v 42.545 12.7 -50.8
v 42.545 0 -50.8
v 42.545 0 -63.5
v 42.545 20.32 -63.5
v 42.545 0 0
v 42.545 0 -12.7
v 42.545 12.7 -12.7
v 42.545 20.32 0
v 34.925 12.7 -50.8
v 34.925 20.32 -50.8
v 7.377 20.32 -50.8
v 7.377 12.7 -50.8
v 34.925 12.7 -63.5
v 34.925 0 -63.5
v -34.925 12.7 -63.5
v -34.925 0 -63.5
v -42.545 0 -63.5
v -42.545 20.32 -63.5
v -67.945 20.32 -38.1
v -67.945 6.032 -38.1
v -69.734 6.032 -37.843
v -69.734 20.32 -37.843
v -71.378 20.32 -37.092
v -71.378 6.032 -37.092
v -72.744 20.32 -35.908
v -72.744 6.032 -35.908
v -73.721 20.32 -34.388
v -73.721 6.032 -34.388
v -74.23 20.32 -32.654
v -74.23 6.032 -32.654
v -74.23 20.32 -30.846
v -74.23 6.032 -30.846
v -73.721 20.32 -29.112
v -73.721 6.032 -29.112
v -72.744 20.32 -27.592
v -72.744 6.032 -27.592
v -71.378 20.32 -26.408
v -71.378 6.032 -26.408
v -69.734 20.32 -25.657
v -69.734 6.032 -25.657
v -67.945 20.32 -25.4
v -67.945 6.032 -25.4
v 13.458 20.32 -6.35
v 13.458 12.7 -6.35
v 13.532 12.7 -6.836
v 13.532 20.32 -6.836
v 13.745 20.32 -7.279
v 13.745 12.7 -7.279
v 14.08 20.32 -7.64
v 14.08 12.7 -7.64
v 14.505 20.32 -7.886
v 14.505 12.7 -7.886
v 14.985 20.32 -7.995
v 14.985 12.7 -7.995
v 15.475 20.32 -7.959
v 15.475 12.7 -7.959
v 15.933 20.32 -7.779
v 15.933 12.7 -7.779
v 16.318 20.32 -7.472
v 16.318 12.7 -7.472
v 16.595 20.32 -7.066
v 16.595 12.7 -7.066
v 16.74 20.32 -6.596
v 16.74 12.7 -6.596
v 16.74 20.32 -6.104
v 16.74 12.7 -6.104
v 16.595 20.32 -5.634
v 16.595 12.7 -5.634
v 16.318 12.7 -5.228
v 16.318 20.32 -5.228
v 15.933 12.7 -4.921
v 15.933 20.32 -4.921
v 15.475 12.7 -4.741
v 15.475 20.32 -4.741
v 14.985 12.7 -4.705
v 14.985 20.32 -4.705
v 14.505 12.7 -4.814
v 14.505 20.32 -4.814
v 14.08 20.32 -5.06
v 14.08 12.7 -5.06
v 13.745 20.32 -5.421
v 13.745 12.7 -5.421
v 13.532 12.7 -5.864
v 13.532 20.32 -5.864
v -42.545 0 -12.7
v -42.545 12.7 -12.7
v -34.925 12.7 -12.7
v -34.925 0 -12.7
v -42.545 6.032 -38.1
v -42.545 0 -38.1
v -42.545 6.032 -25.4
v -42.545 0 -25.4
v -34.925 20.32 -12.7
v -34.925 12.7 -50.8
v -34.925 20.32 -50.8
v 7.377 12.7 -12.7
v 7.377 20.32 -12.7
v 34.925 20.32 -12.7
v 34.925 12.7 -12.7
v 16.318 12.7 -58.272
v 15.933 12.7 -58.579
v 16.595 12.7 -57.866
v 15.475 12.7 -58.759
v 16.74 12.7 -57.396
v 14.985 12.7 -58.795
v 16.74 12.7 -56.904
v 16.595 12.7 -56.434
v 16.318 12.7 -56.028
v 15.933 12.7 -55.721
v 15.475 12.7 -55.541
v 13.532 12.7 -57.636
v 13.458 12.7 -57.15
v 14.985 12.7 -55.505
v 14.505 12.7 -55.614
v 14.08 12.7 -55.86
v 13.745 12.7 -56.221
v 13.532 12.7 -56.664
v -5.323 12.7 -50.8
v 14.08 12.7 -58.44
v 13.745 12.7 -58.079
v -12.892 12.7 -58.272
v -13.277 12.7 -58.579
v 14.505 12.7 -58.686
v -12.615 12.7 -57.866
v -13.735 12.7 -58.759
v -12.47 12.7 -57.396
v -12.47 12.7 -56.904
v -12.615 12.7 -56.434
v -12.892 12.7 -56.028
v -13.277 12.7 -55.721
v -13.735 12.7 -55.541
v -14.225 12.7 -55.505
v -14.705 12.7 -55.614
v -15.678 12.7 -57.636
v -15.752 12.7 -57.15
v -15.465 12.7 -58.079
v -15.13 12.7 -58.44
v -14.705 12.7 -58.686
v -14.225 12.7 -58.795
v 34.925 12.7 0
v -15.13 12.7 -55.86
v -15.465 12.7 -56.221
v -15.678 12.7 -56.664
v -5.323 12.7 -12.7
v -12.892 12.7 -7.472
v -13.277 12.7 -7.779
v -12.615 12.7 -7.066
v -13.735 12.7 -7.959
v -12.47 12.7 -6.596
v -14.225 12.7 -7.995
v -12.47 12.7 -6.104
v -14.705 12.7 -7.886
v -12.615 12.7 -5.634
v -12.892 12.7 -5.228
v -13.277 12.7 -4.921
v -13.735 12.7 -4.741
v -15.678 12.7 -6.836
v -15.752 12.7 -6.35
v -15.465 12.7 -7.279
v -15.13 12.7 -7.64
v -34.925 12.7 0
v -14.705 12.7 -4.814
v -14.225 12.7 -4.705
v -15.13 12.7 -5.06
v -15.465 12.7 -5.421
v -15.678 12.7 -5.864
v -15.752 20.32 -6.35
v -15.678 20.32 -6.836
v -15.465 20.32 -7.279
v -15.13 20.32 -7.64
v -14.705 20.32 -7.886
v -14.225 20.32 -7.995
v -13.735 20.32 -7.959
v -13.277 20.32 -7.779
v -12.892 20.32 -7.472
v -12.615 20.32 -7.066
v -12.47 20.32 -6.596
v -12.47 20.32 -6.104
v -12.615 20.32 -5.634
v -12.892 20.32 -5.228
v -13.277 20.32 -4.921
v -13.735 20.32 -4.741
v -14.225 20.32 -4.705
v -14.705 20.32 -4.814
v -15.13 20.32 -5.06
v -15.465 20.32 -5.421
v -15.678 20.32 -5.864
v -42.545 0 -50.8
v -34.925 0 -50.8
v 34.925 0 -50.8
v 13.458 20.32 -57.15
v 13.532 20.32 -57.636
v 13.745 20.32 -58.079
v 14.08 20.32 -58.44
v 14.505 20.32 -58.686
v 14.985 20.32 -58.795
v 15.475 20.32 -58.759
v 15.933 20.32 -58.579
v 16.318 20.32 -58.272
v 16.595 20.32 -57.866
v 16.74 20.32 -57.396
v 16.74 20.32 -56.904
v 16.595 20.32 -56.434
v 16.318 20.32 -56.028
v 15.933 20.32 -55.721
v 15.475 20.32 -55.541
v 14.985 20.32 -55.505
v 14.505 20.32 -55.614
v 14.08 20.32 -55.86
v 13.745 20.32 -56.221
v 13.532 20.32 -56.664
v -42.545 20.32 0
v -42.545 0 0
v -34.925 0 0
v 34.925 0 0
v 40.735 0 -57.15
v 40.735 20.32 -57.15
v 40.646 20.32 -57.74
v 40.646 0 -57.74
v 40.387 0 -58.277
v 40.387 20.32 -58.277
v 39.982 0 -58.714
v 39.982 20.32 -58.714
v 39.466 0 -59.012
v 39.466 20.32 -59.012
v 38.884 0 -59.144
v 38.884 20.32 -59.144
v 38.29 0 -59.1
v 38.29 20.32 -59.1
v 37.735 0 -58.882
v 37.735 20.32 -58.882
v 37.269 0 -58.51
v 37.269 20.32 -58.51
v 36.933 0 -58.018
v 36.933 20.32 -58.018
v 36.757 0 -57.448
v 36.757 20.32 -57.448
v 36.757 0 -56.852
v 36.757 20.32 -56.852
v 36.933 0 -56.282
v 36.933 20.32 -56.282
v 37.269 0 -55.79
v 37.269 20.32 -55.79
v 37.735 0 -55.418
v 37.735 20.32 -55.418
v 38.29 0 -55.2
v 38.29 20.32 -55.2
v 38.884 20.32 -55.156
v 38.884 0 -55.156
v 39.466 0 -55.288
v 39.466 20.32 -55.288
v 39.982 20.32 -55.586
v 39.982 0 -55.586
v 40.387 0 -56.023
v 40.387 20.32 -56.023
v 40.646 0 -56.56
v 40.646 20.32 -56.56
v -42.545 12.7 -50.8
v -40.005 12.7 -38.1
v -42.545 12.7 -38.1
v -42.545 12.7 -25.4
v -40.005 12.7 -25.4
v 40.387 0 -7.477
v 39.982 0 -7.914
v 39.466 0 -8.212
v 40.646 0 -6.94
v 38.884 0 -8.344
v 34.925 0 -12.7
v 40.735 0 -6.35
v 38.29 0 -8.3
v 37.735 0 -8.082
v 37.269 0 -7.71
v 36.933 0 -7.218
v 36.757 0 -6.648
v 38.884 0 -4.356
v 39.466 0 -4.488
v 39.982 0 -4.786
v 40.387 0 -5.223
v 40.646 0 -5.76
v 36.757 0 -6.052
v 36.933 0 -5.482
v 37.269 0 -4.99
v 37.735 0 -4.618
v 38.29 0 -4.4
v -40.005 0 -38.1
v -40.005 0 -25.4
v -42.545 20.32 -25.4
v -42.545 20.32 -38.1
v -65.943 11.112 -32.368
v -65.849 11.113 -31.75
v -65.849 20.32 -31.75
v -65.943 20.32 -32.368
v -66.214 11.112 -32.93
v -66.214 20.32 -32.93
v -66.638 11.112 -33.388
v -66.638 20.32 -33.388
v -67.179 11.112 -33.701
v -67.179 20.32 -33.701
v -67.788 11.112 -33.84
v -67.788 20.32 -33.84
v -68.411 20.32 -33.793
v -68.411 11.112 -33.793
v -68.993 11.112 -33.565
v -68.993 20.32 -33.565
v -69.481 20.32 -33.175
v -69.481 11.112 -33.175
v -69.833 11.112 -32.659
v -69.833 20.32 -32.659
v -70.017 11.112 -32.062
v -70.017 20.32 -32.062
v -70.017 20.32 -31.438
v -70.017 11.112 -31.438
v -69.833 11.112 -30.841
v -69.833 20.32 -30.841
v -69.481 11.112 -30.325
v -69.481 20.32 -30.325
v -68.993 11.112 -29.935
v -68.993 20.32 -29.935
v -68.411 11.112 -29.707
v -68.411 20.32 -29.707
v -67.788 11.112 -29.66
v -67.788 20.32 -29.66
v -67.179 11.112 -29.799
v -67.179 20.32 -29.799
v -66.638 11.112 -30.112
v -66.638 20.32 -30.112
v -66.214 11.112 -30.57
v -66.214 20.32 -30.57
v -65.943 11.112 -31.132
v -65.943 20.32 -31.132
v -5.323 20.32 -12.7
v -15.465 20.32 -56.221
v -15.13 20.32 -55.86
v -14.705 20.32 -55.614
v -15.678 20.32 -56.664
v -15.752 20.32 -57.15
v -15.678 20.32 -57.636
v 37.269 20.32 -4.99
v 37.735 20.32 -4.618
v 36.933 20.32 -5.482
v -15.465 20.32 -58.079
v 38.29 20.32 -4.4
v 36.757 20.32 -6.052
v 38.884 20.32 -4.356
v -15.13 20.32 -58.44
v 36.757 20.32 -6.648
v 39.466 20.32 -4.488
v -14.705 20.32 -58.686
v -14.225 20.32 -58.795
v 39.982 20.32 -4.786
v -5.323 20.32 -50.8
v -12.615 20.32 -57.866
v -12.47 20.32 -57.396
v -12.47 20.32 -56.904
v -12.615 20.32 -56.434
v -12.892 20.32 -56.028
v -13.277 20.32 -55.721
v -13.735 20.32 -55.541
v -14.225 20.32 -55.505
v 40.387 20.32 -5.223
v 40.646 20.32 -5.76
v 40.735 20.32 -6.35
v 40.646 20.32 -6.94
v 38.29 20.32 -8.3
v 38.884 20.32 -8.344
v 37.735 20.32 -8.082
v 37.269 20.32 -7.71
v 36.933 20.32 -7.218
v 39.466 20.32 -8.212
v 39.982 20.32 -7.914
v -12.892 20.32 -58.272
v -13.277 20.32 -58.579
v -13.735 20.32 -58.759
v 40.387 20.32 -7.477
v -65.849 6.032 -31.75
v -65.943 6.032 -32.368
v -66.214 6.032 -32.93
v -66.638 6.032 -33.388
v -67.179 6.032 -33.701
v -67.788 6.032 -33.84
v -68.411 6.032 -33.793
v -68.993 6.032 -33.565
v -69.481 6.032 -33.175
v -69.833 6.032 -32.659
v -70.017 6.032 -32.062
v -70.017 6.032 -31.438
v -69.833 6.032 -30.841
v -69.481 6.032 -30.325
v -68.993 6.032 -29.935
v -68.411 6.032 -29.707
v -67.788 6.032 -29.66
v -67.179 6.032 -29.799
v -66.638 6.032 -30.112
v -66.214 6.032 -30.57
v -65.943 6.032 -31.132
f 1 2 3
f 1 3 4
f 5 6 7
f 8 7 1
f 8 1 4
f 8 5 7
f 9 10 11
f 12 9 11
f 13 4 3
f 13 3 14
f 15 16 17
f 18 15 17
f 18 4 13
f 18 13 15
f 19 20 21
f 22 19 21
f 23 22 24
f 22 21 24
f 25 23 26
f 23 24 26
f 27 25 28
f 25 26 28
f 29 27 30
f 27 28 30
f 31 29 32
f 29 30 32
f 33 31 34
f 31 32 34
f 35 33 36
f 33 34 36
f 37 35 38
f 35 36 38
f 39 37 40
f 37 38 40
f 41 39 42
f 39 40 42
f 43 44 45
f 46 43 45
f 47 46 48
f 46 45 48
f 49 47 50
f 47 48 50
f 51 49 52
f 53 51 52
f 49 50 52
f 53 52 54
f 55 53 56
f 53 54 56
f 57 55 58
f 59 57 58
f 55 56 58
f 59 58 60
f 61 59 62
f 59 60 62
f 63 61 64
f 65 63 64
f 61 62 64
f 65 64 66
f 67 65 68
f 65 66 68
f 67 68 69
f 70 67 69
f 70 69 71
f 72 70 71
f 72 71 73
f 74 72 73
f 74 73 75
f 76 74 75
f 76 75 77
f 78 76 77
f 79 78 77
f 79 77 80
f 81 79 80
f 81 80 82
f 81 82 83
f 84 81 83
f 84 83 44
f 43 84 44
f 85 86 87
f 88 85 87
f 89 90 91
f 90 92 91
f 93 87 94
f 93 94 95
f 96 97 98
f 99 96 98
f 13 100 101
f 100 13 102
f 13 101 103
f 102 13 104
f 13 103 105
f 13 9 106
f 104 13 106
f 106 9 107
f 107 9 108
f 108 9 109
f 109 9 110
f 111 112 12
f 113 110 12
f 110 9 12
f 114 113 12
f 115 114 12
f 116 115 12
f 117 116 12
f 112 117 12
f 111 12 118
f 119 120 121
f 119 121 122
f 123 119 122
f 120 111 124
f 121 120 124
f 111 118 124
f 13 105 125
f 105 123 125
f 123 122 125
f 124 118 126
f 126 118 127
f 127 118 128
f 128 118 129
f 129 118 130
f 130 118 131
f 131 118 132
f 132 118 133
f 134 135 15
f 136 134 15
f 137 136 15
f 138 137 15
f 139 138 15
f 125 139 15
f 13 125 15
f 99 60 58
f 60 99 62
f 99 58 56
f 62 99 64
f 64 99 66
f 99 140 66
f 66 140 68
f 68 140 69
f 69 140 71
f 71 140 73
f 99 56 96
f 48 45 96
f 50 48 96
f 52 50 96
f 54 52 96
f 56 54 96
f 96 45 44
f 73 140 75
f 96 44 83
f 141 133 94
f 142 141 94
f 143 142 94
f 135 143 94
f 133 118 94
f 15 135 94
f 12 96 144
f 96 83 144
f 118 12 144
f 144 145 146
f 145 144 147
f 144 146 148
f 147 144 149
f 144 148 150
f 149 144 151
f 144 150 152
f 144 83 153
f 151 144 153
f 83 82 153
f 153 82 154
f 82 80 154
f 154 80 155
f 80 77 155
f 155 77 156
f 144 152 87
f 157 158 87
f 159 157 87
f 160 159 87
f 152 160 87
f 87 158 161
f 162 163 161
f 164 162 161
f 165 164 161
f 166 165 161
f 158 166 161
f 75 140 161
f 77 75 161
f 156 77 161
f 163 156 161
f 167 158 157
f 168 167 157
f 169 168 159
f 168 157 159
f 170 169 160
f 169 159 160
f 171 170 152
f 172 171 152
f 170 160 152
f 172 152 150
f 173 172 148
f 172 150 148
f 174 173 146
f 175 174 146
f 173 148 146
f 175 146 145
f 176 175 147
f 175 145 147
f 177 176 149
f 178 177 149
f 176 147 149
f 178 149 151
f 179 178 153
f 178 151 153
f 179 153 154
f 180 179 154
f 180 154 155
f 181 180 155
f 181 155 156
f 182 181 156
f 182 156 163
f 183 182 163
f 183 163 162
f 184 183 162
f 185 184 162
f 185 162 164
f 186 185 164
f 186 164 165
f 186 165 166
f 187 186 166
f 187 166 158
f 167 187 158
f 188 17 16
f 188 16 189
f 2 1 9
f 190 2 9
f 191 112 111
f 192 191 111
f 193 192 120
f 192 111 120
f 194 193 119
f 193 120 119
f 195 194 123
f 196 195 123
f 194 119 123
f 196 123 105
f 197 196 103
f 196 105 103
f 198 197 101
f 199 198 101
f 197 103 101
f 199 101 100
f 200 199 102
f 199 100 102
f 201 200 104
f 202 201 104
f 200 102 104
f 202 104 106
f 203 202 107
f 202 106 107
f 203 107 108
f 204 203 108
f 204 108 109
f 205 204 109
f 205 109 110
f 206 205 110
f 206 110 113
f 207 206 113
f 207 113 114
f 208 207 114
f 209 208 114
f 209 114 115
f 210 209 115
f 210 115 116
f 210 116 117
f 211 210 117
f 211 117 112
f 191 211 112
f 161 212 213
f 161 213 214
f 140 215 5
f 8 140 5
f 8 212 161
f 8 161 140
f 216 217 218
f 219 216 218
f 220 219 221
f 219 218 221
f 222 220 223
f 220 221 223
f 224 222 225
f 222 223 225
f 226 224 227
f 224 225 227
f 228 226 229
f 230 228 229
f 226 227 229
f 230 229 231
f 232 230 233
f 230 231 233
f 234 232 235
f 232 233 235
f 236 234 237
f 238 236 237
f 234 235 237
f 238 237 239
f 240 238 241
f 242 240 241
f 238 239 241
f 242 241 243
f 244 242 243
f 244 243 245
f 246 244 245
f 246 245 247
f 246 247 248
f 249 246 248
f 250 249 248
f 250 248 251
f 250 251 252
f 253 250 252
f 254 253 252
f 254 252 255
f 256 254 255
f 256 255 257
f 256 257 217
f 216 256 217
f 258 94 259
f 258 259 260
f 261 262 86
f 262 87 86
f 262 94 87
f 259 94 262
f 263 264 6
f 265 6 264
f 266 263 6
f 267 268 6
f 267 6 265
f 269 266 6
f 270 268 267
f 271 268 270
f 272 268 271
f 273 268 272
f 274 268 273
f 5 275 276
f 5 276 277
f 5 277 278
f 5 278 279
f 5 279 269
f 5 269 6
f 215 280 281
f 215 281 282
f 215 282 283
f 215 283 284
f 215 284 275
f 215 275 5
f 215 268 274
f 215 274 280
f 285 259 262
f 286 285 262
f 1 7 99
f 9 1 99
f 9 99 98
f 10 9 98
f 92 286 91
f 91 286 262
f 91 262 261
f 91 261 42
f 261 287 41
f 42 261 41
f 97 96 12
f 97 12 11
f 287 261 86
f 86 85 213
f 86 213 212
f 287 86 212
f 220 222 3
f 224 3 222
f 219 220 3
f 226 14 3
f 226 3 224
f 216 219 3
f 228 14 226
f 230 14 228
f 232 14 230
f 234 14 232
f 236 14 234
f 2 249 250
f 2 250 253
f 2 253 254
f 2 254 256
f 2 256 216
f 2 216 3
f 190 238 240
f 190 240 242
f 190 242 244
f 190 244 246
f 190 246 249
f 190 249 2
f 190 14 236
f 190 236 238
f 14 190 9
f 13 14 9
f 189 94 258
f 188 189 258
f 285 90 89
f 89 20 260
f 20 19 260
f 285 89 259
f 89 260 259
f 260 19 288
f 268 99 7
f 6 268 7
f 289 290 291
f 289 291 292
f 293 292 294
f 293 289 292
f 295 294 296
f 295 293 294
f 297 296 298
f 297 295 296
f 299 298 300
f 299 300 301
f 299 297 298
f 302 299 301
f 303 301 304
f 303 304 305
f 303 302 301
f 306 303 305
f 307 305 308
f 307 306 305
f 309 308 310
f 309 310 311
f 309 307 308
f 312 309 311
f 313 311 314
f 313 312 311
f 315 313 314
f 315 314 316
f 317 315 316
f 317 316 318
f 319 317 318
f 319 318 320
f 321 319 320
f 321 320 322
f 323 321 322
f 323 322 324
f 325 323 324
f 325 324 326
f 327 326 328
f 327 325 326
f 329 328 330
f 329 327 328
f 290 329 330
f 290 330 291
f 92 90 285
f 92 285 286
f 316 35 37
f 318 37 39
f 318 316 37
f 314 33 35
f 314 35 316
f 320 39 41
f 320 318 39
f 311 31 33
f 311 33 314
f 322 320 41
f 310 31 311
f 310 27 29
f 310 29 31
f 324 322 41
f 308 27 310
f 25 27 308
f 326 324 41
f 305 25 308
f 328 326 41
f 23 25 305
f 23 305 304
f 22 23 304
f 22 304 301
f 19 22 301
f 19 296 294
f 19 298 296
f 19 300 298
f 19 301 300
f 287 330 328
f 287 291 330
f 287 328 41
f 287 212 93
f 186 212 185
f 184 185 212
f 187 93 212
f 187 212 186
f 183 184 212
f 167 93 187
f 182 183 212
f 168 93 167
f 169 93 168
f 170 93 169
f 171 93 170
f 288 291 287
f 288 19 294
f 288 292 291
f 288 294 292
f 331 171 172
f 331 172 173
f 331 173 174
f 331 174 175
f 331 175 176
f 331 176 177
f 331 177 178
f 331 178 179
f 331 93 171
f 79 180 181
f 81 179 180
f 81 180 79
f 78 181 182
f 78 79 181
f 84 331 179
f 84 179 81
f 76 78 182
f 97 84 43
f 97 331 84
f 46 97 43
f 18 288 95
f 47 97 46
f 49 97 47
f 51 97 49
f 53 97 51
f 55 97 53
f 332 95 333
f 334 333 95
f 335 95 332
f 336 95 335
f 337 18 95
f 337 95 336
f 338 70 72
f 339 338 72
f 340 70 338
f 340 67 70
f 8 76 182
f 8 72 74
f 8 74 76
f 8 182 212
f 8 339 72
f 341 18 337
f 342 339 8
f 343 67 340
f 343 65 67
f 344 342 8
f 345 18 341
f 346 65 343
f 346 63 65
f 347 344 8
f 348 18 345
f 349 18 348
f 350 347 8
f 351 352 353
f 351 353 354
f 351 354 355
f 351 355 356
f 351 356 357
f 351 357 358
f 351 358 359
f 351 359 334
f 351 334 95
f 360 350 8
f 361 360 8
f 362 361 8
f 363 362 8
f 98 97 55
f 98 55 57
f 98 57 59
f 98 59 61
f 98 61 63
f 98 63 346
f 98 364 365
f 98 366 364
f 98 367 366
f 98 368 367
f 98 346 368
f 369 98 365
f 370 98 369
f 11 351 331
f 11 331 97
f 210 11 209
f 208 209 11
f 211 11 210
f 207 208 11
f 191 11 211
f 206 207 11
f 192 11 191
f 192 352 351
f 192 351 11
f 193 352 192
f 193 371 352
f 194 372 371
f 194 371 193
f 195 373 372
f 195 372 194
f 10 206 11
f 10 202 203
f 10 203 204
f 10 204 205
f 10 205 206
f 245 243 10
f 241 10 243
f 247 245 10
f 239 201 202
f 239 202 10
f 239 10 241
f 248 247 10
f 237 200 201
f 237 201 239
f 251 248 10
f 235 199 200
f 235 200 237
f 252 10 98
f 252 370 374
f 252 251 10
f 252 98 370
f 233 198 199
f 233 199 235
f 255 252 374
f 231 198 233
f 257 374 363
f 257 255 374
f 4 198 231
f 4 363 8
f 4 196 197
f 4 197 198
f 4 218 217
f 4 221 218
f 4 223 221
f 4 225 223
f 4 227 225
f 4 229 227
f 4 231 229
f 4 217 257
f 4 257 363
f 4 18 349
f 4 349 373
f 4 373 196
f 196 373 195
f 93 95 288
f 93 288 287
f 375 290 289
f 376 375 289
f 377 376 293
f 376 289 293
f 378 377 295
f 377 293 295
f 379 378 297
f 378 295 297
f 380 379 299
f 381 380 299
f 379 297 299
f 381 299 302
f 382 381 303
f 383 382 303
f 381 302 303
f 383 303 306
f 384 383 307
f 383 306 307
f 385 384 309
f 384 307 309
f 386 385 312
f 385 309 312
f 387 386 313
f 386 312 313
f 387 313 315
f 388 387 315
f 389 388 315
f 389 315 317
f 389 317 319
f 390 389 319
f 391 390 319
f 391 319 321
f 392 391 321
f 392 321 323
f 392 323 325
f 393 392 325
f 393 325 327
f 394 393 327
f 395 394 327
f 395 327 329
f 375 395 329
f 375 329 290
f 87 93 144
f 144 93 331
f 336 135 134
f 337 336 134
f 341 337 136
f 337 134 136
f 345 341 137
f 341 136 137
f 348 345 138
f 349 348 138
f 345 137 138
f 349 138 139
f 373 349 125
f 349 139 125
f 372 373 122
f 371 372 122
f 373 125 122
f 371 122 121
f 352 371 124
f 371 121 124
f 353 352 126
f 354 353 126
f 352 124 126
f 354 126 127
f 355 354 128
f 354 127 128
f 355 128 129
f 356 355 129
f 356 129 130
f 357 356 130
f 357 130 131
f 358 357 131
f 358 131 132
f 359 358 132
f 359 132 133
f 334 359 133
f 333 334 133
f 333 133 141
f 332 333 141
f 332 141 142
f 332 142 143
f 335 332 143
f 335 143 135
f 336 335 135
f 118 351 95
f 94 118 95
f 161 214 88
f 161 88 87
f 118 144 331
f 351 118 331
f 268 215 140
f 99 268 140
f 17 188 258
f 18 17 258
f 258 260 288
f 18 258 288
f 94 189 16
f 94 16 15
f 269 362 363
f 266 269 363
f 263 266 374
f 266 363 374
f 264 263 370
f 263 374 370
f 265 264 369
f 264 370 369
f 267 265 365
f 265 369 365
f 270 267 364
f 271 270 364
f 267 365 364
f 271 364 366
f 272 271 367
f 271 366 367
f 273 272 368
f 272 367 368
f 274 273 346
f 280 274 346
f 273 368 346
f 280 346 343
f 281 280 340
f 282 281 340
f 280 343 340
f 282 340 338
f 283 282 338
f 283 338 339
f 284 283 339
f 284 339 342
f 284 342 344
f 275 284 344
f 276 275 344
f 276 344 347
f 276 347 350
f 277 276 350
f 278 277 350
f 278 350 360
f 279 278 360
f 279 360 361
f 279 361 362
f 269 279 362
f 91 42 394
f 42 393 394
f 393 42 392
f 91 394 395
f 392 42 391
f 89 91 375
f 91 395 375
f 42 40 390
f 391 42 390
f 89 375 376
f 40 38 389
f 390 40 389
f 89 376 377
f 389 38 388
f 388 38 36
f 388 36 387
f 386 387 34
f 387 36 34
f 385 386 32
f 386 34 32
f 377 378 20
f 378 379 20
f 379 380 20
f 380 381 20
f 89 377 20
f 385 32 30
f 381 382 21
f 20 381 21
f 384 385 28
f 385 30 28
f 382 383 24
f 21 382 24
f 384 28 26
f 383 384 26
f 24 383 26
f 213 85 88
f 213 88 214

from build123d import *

# Parameters (mm, degrees)
SKETCH1_W               = 85.09
SKETCH1_H               = 40.64
SKETCH1_W_2             = 69.85
SKETCH1_H_2             = 25.4
BOSS_EXTRUDE1_DEPTH     = 12.7
SKETCH2_W               = 7.62
SKETCH2_H               = 7.62
SKETCH2_W_2             = 12.7
BOSS_EXTRUDE2_DEPTH     = 38.1
SKETCH4_W               = 85.09
SKETCH4_H               = 40.64
SKETCH4_W_2             = 69.85
SKETCH4_H_2             = 25.4
BOSS_EXTRUDE3_DEPTH     = 12.7
SKETCH6_W               = 12.7
SKETCH6_H               = 40.64
BOSS_EXTRUDE4_DEPTH     = 2.54
SKETCH7_W               = 12.7
SKETCH7_H               = 5.08
BOSS_EXTRUDE5_DEPTH     = 25.4
SKETCH8_W               = 6.35
SKETCH8_H               = 5.08
REVOLVE2_ANGLE          = 180
SKETCH10_R              = 2.0955
CUT_EXTRUDE4_DEPTH      = 32.4325
M4X0_7_TAPPED_HOLE1_D   = 3.3
SKETCH17_R              = 2.0955
BOSS_EXTRUDE6_DEPTH     = 9.2075
SKETCH18_R              = 2.0955
BOSS_EXTRUDE7_DEPTH     = 6.35
SKETCH24_W              = 63.5
SKETCH24_H              = 20.32
CUT_EXTRUDE9_DEPTH      = 32.75
CUT_EXTRUDE9_DEPTH_BACK = 86.09
CUT_EXTRUDE10_REACH     = 22.32
SKETCH25_R              = 2


with BuildPart() as part:
    # Sketch1 → Boss-Extrude1 (new body)
    with BuildSketch(Plane.XY):
        Rectangle(SKETCH1_W, SKETCH1_H)
        Rectangle(SKETCH1_W_2, SKETCH1_H_2, mode=Mode.SUBTRACT)
    extrude(amount=-BOSS_EXTRUDE1_DEPTH)

    # Sketch2 → Boss-Extrude2 (add)
    with BuildSketch(Plane(origin=(0, 0, -12.7), x_dir=(-1, 0, 0), z_dir=(0, 0, -1))):
        with Locations((-38.735, 16.51)):
            Rectangle(SKETCH2_W, SKETCH2_H)
        with Locations((-1.026508909, 16.51)):
            Rectangle(SKETCH2_W_2, SKETCH2_H)
        with Locations((38.735, 16.51)):
            Rectangle(SKETCH2_W, SKETCH2_H)
        with Locations((38.735, -16.51)):
            Rectangle(SKETCH2_W, SKETCH2_H)
        with Locations((-1.026508909, -16.51)):
            Rectangle(SKETCH2_W_2, SKETCH2_H)
        with Locations((-38.735, -16.51)):
            Rectangle(SKETCH2_W, SKETCH2_H)
    extrude(amount=BOSS_EXTRUDE2_DEPTH)

    # Sketch4 → Boss-Extrude3 (add)
    with BuildSketch(Plane(origin=(0, 0, -50.8), x_dir=(-1, 0, 0), z_dir=(0, 0, -1))):
        Rectangle(SKETCH4_W, SKETCH4_H)
        Rectangle(SKETCH4_W_2, SKETCH4_H_2, mode=Mode.SUBTRACT)
    extrude(amount=BOSS_EXTRUDE3_DEPTH)

    # Sketch6 → Boss-Extrude4 (add)
    with BuildSketch(Plane.ZY.offset(42.545)):
        with Locations((-31.75, 0)):
            Rectangle(SKETCH6_W, SKETCH6_H)
    extrude(amount=-BOSS_EXTRUDE4_DEPTH)

    # Sketch7 → Boss-Extrude5 (add)
    with BuildSketch(Plane.ZY.offset(42.545)):
        with Locations((-31.75, 8.5725)):
            Rectangle(SKETCH7_W, SKETCH7_H)
        with Locations((-31.75, -8.5725)):
            Rectangle(SKETCH7_W, SKETCH7_H)
    extrude(amount=BOSS_EXTRUDE5_DEPTH)

    # Sketch8 → Revolve2 (revolve)
    with BuildSketch(Plane.ZY.offset(67.945)):
        with Locations((-28.575, 8.5725)):
            Rectangle(SKETCH8_W, SKETCH8_H)
        with Locations((-28.575, -8.5725)):
            Rectangle(SKETCH8_W, SKETCH8_H)
    revolve(axis=Axis((-67.945, 11.1125, -31.75), (0, -1, 0)), revolution_arc=REVOLVE2_ANGLE)

    # Sketch10 → Cut-Extrude4 (cut, through all)
    with BuildSketch(Plane(origin=(0, 11.1125, 0), x_dir=(1, 0, 0), z_dir=(0, 1, 0))):
        with Locations((-67.945, 31.75)):
            Circle(SKETCH10_R)
    extrude(amount=-CUT_EXTRUDE4_DEPTH, mode=Mode.SUBTRACT)

    # M4x0.7 Tapped Hole1 (through all)
    with Locations(Plane(origin=(0, 20.32, 0), x_dir=(1, 0, 0), z_dir=(0, 1, 0))):
        with Locations((-14.101699785, 57.15), (15.108300215, 57.15), (15.108300215, 6.35), (-14.101699785, 6.35)):
            Hole(M4X0_7_TAPPED_HOLE1_D / 2)

    # Sketch17 → Boss-Extrude6 (add)
    with BuildSketch(Plane(origin=(0, 11.1125, 0), x_dir=(1, 0, 0), z_dir=(0, 1, 0))):
        with BuildLine():
            Line((-67.945, 25.4), (-42.545, 25.4))
            Line((-42.545, 25.4), (-42.545, 38.1))
            Line((-42.545, 38.1), (-67.945, 38.1))
            ThreePointArc((-67.945, 38.1), (-74.295, 31.75), (-67.945, 25.4))
        make_face()
        with Locations((-67.945, 31.75)):
            Circle(SKETCH17_R, mode=Mode.SUBTRACT)
    extrude(amount=BOSS_EXTRUDE6_DEPTH)

    # Sketch18 → Boss-Extrude7 (add)
    with BuildSketch(Plane.XZ.offset(11.1125)):
        with BuildLine():
            Line((-42.545, -38.1), (-42.545, -25.4))
            Line((-42.545, -25.4), (-67.945, -25.4))
            ThreePointArc((-67.945, -25.4), (-74.295, -31.75), (-67.945, -38.1))
            Line((-67.945, -38.1), (-42.545, -38.1))
        make_face()
        with Locations((-67.945, -31.75)):
            Circle(SKETCH18_R, mode=Mode.SUBTRACT)
    extrude(amount=BOSS_EXTRUDE7_DEPTH)

    # Sketch24 → Cut-Extrude9 (cut, two sides)
    with BuildSketch(Plane.ZY.offset(42.545)) as cut_extrude9_sk:
        with Locations((-31.75, -10.16)):
            Rectangle(SKETCH24_W, SKETCH24_H)
    extrude(amount=CUT_EXTRUDE9_DEPTH, mode=Mode.SUBTRACT)
    extrude(cut_extrude9_sk.sketch, amount=-CUT_EXTRUDE9_DEPTH_BACK, mode=Mode.SUBTRACT)

    # Sketch25 → Cut-Extrude10 (cut, up to next)
    with BuildSketch(Plane(origin=(0, 20.32, 0), x_dir=(1, 0, 0), z_dir=(0, 1, 0)), mode=Mode.PRIVATE) as cut_extrude10_sk1:
        with Locations((38.735, 57.15)):
            Circle(SKETCH25_R)
    cut_extrude10_tool1 = extrude(cut_extrude10_sk1.sketch, amount=-CUT_EXTRUDE10_REACH, mode=Mode.PRIVATE) & part.part
    add(cut_extrude10_tool1.solids().sort_by_distance((38.735, 20.32, -57.15))[0], mode=Mode.SUBTRACT)
    # Sketch25 → Cut-Extrude10 (cut, up to next)
    with BuildSketch(Plane(origin=(0, 20.32, 0), x_dir=(1, 0, 0), z_dir=(0, 1, 0)), mode=Mode.PRIVATE) as cut_extrude10_sk2:
        with Locations((38.735, 6.35)):
            Circle(SKETCH25_R)
    cut_extrude10_tool2 = extrude(cut_extrude10_sk2.sketch, amount=-CUT_EXTRUDE10_REACH, mode=Mode.PRIVATE) & part.part
    add(cut_extrude10_tool2.solids().sort_by_distance((38.735, 20.32, -6.35))[0], mode=Mode.SUBTRACT)


solid = part.part
